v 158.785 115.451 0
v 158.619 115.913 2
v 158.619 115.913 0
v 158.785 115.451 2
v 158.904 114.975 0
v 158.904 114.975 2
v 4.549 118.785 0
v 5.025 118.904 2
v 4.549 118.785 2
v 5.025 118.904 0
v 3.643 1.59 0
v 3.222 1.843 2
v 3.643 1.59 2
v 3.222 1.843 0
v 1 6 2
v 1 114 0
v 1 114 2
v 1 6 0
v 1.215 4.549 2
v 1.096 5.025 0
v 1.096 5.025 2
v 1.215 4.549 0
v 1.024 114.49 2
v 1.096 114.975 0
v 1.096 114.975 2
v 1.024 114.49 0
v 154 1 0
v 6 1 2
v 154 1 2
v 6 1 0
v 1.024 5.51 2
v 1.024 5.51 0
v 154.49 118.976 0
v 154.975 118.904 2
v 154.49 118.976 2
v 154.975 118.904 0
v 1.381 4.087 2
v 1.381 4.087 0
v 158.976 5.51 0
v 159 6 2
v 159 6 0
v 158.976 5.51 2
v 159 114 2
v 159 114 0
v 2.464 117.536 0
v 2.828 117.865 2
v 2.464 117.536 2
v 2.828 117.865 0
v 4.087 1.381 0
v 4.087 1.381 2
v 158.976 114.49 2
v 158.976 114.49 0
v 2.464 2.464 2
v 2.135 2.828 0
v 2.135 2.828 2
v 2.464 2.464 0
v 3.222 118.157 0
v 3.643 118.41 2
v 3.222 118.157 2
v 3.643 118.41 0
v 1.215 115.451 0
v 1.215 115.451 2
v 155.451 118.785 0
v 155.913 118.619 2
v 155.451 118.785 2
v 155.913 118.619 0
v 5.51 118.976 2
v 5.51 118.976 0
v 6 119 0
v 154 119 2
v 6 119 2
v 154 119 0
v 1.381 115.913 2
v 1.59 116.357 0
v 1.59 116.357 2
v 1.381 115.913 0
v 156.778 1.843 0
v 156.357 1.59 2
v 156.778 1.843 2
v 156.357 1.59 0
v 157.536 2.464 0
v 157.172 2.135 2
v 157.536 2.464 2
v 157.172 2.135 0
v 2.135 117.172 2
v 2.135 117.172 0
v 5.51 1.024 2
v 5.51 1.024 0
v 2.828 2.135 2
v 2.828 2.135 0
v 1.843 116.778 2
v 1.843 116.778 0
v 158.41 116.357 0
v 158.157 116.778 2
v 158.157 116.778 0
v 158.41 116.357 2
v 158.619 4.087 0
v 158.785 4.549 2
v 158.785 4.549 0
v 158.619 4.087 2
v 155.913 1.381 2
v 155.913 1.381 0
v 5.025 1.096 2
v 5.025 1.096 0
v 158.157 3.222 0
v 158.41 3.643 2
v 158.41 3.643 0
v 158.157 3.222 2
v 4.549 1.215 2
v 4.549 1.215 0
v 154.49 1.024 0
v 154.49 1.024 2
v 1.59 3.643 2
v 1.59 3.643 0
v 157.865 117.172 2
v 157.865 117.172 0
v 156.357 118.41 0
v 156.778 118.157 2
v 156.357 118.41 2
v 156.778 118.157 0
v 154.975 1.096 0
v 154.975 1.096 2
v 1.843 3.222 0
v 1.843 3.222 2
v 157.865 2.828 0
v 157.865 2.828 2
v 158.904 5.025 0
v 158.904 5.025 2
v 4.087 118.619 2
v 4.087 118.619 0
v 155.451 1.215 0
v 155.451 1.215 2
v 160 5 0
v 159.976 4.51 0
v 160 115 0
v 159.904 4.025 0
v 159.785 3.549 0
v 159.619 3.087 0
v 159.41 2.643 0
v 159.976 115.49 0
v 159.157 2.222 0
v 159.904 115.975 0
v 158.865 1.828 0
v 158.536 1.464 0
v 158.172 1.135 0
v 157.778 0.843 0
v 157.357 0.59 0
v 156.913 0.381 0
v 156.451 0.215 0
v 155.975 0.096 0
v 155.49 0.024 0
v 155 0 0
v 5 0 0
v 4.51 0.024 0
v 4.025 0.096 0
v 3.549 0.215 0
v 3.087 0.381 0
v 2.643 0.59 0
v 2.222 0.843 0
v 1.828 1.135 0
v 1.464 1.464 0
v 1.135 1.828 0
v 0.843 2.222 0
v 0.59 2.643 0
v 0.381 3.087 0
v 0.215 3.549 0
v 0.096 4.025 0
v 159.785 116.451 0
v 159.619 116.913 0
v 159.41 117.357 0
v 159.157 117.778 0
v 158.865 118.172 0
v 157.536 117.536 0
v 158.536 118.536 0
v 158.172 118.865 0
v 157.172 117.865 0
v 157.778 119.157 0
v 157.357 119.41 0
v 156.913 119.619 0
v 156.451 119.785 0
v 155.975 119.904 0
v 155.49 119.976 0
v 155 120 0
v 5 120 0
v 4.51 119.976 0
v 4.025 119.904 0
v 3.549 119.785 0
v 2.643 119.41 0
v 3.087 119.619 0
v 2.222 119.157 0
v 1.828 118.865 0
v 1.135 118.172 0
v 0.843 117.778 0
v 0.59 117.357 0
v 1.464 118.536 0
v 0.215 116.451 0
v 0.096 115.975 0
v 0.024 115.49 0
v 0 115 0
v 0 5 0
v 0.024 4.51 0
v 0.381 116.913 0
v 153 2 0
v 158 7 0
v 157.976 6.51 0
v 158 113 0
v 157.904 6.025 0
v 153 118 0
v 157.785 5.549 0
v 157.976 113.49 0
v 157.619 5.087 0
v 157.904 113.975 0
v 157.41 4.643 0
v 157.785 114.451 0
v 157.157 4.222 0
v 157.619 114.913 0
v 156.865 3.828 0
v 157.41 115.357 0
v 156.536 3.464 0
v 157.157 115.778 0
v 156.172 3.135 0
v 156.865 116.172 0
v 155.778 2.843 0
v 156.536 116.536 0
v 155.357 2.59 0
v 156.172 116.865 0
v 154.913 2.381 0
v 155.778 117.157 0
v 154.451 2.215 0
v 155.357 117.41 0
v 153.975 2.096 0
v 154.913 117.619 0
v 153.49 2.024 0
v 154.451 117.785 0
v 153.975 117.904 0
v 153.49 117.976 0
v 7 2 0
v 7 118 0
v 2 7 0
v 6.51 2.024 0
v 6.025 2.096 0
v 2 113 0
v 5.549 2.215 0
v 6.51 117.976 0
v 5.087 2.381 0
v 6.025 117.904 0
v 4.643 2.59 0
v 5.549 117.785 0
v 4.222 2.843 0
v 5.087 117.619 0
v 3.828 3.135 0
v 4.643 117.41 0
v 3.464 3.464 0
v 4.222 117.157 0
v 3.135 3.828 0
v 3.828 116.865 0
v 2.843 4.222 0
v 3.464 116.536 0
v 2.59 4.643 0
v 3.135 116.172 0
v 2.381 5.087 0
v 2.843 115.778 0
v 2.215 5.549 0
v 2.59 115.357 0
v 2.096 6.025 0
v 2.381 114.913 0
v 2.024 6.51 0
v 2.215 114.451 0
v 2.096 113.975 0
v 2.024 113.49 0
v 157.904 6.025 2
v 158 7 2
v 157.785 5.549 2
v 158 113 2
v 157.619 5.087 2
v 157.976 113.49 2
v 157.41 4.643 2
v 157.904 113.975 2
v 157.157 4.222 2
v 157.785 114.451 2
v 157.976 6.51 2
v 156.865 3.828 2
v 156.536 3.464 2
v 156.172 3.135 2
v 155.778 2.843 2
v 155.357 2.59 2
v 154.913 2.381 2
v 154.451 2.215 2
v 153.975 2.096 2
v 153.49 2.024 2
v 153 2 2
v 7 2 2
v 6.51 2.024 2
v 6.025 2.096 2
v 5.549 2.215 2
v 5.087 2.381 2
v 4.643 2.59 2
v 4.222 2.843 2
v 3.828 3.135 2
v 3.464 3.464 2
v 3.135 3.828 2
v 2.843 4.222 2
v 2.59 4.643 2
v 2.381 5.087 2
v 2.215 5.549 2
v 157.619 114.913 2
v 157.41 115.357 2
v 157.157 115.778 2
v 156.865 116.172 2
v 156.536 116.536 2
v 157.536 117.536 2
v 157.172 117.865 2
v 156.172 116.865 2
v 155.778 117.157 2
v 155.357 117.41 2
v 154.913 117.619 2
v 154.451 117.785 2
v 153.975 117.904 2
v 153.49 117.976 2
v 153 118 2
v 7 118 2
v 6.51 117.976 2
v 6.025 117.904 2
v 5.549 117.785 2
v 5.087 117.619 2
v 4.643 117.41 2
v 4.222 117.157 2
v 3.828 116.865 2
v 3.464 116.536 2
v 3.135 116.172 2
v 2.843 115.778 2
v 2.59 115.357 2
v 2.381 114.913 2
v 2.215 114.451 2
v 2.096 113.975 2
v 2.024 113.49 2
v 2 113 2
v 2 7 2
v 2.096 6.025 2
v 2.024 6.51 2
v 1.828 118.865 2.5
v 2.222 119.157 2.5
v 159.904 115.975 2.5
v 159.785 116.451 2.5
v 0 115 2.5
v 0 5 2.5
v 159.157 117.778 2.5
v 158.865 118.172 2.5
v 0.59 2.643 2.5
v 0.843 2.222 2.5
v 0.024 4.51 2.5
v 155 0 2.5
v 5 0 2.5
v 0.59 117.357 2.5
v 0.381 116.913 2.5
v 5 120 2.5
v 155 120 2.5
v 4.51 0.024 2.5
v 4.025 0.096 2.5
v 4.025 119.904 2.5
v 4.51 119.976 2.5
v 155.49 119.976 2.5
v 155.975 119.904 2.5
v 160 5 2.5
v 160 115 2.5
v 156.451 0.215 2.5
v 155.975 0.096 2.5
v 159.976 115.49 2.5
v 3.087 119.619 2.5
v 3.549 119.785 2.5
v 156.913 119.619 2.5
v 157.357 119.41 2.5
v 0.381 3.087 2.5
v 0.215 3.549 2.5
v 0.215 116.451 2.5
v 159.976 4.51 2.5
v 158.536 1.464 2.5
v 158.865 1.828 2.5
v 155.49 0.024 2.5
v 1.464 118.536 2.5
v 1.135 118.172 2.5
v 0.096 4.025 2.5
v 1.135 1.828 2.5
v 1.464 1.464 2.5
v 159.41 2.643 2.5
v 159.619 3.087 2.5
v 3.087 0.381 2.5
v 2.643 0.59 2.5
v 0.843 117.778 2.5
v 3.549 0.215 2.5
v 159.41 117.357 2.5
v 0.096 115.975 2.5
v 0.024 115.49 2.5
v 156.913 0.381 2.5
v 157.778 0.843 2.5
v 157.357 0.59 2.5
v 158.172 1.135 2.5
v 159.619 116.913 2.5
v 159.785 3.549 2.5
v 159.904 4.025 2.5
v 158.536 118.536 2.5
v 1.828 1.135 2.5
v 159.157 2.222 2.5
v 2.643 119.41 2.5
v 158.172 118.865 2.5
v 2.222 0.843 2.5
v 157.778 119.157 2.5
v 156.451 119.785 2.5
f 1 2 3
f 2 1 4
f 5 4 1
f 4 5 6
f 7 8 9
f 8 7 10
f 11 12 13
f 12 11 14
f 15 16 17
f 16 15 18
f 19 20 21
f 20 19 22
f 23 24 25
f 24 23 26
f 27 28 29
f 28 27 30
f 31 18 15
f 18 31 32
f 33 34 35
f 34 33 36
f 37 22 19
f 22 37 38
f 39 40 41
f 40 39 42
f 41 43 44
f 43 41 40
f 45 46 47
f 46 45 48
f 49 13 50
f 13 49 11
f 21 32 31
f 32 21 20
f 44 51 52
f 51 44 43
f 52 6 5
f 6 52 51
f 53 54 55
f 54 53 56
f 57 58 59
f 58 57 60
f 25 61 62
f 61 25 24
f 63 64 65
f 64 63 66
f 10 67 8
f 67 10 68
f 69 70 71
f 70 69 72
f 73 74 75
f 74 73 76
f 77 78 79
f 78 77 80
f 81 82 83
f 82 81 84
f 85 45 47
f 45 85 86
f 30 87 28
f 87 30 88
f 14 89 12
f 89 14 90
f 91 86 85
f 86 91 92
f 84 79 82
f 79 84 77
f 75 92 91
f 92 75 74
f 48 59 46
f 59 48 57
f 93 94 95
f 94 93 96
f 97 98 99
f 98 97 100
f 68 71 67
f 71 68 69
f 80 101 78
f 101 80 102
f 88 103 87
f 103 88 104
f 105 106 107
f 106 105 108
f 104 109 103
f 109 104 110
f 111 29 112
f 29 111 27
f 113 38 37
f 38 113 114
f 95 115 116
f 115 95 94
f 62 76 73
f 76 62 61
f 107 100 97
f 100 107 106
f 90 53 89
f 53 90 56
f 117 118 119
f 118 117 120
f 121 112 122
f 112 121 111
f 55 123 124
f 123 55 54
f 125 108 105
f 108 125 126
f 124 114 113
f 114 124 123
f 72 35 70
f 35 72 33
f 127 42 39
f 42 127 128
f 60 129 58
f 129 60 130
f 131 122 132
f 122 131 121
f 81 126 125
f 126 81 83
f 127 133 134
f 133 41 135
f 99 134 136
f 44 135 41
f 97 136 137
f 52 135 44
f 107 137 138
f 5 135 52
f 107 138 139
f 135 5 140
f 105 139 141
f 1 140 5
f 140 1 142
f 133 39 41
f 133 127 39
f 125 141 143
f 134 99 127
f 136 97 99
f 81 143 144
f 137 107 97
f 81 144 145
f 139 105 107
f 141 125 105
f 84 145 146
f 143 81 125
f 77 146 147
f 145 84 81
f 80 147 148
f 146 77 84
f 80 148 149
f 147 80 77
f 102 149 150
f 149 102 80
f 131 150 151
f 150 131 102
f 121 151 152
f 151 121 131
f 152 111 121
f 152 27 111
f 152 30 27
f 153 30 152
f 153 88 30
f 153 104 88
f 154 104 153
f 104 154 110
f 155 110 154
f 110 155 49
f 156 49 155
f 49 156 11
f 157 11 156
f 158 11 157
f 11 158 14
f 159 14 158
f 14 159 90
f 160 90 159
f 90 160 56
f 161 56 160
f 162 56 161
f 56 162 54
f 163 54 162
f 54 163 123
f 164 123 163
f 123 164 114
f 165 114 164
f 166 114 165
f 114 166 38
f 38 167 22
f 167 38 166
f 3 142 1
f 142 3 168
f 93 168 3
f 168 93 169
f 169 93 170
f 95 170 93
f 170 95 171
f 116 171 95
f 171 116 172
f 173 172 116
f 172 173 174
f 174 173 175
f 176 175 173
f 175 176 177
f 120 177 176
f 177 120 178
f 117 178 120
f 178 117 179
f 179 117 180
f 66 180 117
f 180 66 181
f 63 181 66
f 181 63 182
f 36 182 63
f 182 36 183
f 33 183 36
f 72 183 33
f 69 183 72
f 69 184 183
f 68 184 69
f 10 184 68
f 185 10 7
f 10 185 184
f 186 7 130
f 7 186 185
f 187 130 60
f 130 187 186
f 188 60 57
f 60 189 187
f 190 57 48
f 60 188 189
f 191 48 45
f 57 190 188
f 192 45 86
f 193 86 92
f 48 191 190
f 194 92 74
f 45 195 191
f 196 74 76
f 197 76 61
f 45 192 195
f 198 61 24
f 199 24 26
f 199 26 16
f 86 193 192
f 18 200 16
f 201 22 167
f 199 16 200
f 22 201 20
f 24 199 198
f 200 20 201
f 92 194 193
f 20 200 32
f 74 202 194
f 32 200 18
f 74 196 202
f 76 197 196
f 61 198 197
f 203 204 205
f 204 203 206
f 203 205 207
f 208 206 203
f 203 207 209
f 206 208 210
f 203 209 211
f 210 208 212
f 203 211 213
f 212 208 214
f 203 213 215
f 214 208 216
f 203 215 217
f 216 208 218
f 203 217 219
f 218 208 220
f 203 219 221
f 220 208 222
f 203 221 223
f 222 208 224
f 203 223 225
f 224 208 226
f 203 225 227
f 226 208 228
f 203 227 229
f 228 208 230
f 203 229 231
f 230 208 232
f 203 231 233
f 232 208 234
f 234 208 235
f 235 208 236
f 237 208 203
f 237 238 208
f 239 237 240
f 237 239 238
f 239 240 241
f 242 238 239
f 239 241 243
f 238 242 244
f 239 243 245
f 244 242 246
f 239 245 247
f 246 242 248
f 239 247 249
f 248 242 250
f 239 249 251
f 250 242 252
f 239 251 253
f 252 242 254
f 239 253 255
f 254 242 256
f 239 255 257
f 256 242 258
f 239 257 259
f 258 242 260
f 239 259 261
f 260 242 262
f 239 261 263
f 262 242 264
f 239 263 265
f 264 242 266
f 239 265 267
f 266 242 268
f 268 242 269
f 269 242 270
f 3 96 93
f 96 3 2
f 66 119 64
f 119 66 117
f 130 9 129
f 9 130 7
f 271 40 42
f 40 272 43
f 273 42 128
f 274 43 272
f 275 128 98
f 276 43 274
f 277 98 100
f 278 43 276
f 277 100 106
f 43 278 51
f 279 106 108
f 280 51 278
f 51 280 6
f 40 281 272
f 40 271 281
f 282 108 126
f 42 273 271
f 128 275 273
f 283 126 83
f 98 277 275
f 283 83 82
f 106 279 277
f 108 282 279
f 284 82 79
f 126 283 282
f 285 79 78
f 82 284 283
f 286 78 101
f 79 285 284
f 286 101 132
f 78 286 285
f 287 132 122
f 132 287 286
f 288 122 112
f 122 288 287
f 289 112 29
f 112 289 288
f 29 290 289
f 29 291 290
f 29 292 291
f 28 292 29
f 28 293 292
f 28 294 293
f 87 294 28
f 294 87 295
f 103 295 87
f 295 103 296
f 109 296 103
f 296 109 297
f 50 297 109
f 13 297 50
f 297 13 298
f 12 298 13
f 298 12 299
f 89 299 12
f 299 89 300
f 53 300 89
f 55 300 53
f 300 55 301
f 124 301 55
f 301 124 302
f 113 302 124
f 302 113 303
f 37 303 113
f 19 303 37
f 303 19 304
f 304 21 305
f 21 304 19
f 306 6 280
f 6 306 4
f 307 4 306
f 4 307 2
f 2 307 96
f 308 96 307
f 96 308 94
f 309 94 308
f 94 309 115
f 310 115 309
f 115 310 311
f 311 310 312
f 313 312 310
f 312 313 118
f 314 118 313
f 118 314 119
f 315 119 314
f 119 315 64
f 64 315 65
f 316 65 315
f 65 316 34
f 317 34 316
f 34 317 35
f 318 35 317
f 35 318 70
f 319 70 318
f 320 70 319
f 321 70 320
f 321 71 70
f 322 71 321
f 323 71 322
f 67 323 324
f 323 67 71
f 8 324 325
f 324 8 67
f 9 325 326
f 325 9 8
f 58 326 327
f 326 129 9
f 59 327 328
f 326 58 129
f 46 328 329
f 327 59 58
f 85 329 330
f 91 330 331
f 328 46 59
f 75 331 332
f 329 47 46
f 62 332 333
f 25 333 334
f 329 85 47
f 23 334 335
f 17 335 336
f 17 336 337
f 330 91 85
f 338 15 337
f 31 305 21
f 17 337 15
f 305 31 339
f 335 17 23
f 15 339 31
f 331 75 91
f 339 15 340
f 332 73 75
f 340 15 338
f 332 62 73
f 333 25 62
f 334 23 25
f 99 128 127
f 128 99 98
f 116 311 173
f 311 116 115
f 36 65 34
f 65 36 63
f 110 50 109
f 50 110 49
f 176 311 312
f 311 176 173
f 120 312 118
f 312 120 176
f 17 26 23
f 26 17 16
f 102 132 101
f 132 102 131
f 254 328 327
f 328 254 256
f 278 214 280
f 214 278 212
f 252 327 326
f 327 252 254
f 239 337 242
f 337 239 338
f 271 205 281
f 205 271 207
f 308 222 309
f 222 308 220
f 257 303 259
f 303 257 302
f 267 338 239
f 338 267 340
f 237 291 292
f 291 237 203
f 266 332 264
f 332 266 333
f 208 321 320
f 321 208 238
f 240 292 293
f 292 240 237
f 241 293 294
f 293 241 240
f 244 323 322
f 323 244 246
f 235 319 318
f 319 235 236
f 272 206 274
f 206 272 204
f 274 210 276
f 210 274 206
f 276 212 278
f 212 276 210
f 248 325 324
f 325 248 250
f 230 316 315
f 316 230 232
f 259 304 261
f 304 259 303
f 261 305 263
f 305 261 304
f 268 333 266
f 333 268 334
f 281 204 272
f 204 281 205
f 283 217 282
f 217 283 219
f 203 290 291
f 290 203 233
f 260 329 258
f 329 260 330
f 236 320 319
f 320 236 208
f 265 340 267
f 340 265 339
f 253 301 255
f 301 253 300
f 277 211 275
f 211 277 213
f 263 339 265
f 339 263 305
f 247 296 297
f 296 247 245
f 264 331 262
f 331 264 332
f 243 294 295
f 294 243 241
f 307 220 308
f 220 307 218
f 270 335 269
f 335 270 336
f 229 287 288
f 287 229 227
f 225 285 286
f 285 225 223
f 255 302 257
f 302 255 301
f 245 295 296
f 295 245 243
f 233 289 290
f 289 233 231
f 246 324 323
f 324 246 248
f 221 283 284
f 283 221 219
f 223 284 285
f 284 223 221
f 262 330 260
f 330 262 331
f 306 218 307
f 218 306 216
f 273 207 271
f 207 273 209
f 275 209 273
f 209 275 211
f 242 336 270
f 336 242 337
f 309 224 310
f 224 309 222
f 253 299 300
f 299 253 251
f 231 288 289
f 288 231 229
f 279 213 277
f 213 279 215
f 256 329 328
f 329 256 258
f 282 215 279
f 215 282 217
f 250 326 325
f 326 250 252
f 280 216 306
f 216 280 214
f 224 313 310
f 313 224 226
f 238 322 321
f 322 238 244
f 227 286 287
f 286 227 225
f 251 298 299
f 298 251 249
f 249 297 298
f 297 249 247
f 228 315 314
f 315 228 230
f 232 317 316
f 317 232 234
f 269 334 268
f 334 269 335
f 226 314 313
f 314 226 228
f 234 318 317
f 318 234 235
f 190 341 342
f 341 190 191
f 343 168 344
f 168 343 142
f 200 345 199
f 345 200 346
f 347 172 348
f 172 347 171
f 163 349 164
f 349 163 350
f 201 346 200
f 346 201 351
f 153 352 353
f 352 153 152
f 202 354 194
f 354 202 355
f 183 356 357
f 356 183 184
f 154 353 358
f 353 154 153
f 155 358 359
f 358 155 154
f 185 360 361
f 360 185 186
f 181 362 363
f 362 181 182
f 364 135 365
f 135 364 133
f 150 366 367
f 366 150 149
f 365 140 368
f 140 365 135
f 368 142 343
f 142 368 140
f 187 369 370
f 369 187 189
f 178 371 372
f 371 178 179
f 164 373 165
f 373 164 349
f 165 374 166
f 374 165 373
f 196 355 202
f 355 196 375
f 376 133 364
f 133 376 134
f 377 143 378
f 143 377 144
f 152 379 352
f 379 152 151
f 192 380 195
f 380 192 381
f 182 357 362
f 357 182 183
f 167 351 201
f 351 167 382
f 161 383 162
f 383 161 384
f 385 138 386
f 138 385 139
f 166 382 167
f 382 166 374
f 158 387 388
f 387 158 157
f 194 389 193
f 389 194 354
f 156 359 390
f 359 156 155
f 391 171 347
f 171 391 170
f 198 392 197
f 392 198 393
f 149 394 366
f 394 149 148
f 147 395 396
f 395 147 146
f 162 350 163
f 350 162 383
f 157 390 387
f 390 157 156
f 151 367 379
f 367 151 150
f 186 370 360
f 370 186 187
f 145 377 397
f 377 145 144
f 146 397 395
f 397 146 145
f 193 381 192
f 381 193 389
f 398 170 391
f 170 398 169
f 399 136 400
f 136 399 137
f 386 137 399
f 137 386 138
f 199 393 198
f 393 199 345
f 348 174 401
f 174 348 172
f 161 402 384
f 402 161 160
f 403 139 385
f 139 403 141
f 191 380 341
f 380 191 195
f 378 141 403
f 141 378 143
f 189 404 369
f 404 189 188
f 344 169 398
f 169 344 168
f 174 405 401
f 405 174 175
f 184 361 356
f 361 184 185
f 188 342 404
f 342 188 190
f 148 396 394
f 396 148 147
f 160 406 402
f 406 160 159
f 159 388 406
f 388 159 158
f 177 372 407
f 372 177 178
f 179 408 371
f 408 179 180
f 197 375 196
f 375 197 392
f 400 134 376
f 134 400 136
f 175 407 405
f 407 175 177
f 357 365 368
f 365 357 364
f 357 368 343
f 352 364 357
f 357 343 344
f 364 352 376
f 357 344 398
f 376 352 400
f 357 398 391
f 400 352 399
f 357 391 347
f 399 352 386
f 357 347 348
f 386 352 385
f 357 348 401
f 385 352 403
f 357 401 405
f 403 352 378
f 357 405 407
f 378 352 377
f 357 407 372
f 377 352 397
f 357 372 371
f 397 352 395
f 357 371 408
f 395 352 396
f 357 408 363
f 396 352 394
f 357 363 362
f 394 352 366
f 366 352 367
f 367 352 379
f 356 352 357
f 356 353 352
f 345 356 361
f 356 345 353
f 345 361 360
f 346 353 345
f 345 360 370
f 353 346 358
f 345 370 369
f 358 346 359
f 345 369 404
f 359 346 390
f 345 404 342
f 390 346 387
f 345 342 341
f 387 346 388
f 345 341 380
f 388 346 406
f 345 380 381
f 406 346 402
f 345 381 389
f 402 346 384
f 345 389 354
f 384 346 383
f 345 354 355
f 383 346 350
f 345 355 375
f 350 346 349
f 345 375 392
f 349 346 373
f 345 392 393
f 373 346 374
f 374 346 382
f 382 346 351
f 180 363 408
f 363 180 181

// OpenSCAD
// ========================
// Parameters
// ========================
corner_r = 5;    // PCB corner radius

wall_thickness = 2;  // Wall thickness
$fn = 64;              // smooth corners


// Case
case_width = 160;
case_lenght = 120;
case_height = 2.5;

border_height = 2;

// Outer cylinder
outer_r = 3;
outer_h = 4;

// Inner hole
hole_r = 3;
hole_h = 2;

// USB-C connector
usbc_l = 10;
usbc_h = 5;

// LED
led_r = 5;

// increase for smoother cone ($fn)
segments = 64;

net = false;

// ========================
// Case Top Module
// ========================
module case_top() {

    // Translate so inner PCB pocket starts at (0,0)
    translate([corner_r, corner_r, 0]) {
        difference() {
            
            // Outer shell (walls included)
            linear_extrude(height = case_height)
                rounded_rect(case_width,
                             case_lenght,
                             corner_r);
            
            border_bottom();
        }
    }
}

module border_bottom() {
    difference() {
        // Top hollow interior
        translate([1, 1, 0])
            linear_extrude(height = border_height)
                rounded_rect(case_width-2, case_lenght-2, corner_r);
        translate([2, 2, 0])
            linear_extrude(height = border_height)
                rounded_rect(case_width-4, case_lenght-4, corner_r);
        
    }
}

// ========================
// Rounded rectangle module
// ========================
module rounded_rect(x, y, radius) {
    minkowski() {
        square([x - 2*radius, y - 2*radius], center = false);
        circle(r = radius, $fn = $fn);
    }
}

// Helper functions
function sum_first(arr, n) =
    n == 0 ? 0 : arr[n - 1] + sum_first(arr, n - 1);

// ========================
// Top case
// ========================

case_top();

// -------------------- PARAMETERS --------------------
ratios = [1];   // must sum to 1

availableSpace = case_width-2*wall_thickness;             // total X space
//wall_thickness = 3;               // x
//case_length = 100;                // y
//case_height = 50;                 // z

wall_height = case_height - 2 - 2.5;

echo("Total: ");
echo(availableSpace);

// -------------------- WALL GENERATION --------------------
if (1 < len(ratios)) {
    for (i = [0 : len(ratios) - 2]) {   // no wall for last element

        space = ratios[i] * availableSpace;

        // cumulative space before this element
        x_cursor = sum_first(
            [for (j = [0 : len(ratios) - 1]) ratios[j] * availableSpace],
            i
        ) + len(ratios)-1 * wall_thickness;

        wall_pos = x_cursor + space - wall_thickness / 2;

        echo("i =", i);
        echo("space =", space);
        echo("x_cursor =", x_cursor);
        echo("wall_pos =", wall_pos);

        translate([
            wall_pos,
            0,
            2.5
        ])
            cube([
                wall_thickness,
                case_lenght - 2,
                wall_height
            ]);
    }
}
